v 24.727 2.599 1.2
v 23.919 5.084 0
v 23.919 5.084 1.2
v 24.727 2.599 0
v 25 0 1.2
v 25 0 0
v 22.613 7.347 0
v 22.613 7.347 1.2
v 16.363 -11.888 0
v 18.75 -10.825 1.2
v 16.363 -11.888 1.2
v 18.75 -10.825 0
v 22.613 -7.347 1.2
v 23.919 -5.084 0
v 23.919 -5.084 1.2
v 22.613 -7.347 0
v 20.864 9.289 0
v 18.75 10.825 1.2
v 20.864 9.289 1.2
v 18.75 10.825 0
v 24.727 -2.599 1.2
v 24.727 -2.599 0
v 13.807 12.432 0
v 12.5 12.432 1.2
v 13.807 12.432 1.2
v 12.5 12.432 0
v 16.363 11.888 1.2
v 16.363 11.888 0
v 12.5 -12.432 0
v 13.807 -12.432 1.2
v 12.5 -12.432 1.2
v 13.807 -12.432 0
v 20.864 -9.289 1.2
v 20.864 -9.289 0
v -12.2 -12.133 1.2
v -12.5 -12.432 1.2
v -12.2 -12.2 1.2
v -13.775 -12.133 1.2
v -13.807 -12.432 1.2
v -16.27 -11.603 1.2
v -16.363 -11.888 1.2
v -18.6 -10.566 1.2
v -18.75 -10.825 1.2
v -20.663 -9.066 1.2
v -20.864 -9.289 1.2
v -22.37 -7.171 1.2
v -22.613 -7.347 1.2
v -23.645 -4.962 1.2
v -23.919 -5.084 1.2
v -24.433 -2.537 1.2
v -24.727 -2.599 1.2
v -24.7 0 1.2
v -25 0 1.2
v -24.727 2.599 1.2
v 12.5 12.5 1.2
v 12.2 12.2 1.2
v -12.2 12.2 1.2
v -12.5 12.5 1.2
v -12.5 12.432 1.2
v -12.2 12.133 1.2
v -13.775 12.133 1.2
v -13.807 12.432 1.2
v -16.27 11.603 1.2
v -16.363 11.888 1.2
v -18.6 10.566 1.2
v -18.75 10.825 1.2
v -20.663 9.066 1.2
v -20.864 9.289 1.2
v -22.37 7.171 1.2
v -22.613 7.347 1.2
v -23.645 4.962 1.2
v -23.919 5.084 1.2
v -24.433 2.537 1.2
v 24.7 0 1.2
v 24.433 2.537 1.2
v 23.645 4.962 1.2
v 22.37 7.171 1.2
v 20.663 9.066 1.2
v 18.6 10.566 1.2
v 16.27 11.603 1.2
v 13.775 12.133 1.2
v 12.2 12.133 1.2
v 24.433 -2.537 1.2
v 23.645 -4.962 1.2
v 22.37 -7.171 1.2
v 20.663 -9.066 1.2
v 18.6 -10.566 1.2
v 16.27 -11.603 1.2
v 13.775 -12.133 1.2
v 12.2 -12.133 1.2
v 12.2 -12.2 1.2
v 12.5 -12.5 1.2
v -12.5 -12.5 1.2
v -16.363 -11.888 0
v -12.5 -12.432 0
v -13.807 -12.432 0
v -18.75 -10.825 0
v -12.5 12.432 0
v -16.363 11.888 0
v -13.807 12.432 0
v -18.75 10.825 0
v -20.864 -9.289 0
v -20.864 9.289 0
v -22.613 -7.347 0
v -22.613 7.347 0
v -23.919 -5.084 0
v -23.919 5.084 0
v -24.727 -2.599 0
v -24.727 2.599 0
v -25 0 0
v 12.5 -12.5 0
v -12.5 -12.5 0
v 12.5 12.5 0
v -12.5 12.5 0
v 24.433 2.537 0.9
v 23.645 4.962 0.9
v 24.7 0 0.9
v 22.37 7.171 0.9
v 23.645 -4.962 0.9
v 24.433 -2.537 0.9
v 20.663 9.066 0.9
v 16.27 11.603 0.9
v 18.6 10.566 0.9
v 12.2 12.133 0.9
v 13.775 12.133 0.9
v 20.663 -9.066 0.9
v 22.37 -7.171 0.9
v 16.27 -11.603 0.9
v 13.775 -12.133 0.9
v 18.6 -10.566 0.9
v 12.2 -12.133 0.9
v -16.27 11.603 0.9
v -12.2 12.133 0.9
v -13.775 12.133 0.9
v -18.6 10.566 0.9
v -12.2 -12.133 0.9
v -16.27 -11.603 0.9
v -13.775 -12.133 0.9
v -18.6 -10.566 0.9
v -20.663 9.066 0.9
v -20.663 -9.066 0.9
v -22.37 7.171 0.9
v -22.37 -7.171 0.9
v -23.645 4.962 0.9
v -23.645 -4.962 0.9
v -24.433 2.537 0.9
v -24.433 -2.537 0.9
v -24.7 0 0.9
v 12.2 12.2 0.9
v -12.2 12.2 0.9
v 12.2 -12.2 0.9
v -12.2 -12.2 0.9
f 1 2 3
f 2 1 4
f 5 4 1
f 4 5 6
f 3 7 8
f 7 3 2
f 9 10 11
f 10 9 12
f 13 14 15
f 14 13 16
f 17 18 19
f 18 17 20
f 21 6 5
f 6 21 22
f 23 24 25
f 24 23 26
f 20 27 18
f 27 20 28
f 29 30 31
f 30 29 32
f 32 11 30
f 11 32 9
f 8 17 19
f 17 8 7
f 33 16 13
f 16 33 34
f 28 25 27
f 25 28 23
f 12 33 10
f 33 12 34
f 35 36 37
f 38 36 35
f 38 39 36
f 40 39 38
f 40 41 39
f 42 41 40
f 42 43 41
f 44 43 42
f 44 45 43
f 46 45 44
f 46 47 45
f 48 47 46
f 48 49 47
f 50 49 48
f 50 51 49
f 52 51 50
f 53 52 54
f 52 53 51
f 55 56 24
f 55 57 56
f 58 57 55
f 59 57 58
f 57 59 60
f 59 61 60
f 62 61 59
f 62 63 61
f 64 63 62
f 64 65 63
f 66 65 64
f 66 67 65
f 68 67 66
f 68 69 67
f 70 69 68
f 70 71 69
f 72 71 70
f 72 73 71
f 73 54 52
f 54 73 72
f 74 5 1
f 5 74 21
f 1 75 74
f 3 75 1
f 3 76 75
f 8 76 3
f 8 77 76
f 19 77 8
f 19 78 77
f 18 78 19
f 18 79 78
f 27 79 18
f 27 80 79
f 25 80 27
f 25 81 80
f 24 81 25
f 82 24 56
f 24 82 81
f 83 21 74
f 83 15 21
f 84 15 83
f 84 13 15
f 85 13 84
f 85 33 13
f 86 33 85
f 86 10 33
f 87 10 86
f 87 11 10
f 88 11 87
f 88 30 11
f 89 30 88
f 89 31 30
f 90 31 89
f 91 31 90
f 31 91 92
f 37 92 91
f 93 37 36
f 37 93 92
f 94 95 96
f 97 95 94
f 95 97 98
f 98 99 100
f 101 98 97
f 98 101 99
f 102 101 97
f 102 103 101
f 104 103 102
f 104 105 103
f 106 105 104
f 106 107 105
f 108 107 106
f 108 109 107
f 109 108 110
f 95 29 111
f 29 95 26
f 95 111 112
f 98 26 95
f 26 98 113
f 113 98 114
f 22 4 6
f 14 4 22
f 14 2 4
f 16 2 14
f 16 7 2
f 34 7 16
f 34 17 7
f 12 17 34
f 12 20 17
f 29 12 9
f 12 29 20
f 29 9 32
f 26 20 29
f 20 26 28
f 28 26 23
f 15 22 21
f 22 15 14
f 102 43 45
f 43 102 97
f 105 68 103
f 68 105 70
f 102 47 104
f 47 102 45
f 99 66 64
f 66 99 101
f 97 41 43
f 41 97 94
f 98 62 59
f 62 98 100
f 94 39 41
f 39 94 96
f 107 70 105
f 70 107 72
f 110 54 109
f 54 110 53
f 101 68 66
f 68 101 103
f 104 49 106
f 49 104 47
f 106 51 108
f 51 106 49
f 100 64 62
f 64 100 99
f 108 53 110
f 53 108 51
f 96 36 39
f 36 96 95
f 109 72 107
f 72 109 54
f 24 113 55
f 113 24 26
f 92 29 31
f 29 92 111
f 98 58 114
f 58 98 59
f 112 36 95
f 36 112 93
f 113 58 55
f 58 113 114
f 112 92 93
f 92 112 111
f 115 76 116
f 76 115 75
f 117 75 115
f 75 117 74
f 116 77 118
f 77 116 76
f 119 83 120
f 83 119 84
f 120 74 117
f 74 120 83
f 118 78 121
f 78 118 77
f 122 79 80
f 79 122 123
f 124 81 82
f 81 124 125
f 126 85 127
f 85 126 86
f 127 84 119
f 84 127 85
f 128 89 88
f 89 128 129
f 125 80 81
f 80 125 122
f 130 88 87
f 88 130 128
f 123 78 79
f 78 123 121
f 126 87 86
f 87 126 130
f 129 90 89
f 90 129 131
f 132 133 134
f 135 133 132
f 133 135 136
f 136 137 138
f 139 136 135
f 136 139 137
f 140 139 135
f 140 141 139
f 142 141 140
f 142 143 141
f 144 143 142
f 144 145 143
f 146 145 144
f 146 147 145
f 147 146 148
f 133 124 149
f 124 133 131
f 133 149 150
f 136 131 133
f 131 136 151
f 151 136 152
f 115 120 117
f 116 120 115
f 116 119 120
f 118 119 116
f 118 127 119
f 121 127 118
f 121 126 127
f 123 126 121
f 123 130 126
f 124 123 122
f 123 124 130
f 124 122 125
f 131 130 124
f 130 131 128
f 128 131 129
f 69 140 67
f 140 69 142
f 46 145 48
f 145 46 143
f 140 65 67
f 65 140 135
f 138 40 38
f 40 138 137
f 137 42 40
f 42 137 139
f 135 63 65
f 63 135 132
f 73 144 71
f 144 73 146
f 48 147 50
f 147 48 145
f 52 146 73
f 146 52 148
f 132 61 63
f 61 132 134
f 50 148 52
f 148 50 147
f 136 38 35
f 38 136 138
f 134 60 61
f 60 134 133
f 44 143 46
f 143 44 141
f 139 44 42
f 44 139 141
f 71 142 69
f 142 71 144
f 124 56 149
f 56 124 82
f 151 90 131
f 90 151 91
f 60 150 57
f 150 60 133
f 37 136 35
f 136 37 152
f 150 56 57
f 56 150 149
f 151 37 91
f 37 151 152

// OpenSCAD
difference() {
//    minkowski() {
        union() {
            translate([12.5, 0, 0]) { cylinder(h=1.2, d = 25); }
            translate([-12.5, 0, 0]) { cylinder(h=1.2, d = 25); }
            translate([0, 0, 0.6]) { cube([25, 25, 1.2], center=true); }
        };
//        sphere(0.15);
//    };
        translate([0, 0, 0.9]) union() {
        translate([12.5, 0, 0]) { cylinder(h=1, d = 24.4); }
        translate([-12.5, 0, 0]) { cylinder(h=1, d = 24.4); }
        translate([0, 0, 0.5]) { cube([24.4, 24.4, 1], center=true); }
    };

}
